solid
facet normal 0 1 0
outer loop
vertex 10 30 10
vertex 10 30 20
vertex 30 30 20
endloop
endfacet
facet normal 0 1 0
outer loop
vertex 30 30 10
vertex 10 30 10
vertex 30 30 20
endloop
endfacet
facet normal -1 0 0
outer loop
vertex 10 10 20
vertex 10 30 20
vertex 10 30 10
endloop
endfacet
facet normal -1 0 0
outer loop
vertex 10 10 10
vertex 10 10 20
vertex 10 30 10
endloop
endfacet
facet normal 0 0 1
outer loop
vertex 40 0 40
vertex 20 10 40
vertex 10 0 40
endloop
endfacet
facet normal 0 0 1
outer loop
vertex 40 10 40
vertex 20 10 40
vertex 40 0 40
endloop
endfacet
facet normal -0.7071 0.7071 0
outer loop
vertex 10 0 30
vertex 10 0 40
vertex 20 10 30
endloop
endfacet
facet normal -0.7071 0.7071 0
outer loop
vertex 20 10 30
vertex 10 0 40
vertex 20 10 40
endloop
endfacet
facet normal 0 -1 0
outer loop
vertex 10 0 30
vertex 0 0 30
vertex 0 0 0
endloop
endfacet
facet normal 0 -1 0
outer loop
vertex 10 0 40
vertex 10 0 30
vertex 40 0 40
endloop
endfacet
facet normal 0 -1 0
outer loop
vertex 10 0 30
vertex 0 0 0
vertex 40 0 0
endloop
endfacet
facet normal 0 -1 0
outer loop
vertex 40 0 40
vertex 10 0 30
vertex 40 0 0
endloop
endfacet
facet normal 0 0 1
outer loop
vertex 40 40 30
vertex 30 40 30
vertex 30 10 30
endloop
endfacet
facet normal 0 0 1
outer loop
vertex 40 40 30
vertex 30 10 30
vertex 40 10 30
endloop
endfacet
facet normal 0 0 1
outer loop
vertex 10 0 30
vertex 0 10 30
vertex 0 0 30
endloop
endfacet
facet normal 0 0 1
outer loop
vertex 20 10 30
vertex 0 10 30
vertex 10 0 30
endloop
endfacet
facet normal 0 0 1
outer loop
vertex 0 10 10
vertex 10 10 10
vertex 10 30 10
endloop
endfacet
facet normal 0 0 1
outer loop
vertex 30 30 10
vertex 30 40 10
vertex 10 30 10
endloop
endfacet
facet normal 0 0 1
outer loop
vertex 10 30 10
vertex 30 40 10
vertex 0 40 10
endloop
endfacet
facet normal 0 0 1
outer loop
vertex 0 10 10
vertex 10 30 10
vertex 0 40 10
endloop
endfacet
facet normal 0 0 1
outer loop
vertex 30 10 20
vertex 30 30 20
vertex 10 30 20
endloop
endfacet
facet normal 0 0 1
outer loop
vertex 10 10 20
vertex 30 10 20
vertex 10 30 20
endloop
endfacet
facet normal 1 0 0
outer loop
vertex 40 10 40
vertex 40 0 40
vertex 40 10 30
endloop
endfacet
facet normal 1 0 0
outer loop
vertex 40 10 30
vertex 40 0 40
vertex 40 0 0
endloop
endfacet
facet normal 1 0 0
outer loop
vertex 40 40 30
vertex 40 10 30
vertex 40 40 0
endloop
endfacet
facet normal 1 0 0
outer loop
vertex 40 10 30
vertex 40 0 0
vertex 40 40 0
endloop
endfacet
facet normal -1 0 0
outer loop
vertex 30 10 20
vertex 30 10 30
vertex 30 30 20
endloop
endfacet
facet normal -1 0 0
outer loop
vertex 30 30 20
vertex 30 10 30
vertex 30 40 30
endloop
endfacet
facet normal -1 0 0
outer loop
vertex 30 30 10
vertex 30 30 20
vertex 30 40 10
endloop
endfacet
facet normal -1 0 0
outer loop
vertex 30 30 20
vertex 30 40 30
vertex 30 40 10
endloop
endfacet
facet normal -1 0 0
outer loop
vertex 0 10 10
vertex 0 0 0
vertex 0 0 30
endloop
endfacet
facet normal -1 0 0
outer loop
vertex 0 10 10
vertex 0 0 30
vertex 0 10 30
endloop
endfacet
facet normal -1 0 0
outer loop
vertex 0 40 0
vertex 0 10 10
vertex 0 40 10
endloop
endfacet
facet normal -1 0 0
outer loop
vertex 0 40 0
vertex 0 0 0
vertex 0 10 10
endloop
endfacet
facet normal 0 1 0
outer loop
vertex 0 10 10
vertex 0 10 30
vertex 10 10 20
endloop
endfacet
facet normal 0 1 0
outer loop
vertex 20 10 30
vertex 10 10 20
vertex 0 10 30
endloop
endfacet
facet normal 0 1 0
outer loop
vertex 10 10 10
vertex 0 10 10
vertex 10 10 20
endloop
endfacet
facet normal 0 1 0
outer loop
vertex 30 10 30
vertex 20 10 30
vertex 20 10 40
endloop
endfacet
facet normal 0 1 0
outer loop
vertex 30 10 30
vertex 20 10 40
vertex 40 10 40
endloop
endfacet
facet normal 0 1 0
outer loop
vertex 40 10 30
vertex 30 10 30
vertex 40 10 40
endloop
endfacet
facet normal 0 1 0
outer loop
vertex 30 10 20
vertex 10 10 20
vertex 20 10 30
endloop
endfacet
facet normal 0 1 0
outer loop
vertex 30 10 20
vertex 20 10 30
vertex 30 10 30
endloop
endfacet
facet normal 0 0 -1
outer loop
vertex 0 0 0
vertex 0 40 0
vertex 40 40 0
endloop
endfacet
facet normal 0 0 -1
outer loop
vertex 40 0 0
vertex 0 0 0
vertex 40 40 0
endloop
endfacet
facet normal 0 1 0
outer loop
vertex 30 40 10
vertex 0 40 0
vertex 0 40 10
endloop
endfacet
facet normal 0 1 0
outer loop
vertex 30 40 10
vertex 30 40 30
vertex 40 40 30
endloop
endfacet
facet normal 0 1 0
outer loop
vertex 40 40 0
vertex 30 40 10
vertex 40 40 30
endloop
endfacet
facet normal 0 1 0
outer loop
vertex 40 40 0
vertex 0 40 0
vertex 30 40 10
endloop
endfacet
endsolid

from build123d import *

# Parameters (mm, degrees)
SKETCH1_W           = 40
SKETCH1_H           = 40
BOSS_EXTRUDE1_DEPTH = 40
SKETCH2_W           = 10
SKETCH2_H           = 10
CUT_EXTRUDE1_DEPTH  = 40
SKETCH4_W           = 10
SKETCH4_H           = 30
CUT_EXTRUDE3_DEPTH  = 40
CUT_EXTRUDE4_DEPTH  = 10
CUT_EXTRUDE5_DEPTH  = 30
SKETCH7_W           = 20
SKETCH7_H           = 10
CUT_EXTRUDE6_DEPTH  = 10


with BuildPart() as part:
    # Sketch1 → Boss-Extrude1 (new body)
    with BuildSketch(Plane.XY):
        with Locations((20, 20)):
            Rectangle(SKETCH1_W, SKETCH1_H)
    extrude(amount=BOSS_EXTRUDE1_DEPTH)

    # Sketch2 → Cut-Extrude1 (cut)
    with BuildSketch(Plane(origin=(0, 40, 0), x_dir=(1, 0, 0), z_dir=(0, 1, 0))):
        with Locations((5, -35)):
            Rectangle(SKETCH2_W, SKETCH2_H)
    extrude(amount=-CUT_EXTRUDE1_DEPTH, mode=Mode.SUBTRACT)

    # Sketch4 → Cut-Extrude3 (cut)
    with BuildSketch(Plane.ZY.offset(-10)):
        with Locations((35, 25)):
            Rectangle(SKETCH4_W, SKETCH4_H)
    extrude(amount=-CUT_EXTRUDE3_DEPTH, mode=Mode.SUBTRACT)

    # Sketch5 → Cut-Extrude4 (cut)
    with BuildSketch(Plane.XY.offset(40)):
        Polygon((10, 0), (20, 10), (10, 10), align=None)
    extrude(amount=-CUT_EXTRUDE4_DEPTH, mode=Mode.SUBTRACT)

    # Sketch6 → Cut-Extrude5 (cut)
    with BuildSketch(Plane(origin=(0, 40, 0), x_dir=(1, 0, 0), z_dir=(0, 1, 0))):
        Polygon((0, -30), (20, -30), (30, -30), (30, -20), (10, -20), (10, -10), (0, -10), align=None)
    extrude(amount=-CUT_EXTRUDE5_DEPTH, mode=Mode.SUBTRACT)

    # Sketch7 → Cut-Extrude6 (cut)
    with BuildSketch(Plane.XY.offset(20)):
        with Locations((20, 35)):
            Rectangle(SKETCH7_W, SKETCH7_H)
    extrude(amount=-CUT_EXTRUDE6_DEPTH, mode=Mode.SUBTRACT)


solid = part.part
